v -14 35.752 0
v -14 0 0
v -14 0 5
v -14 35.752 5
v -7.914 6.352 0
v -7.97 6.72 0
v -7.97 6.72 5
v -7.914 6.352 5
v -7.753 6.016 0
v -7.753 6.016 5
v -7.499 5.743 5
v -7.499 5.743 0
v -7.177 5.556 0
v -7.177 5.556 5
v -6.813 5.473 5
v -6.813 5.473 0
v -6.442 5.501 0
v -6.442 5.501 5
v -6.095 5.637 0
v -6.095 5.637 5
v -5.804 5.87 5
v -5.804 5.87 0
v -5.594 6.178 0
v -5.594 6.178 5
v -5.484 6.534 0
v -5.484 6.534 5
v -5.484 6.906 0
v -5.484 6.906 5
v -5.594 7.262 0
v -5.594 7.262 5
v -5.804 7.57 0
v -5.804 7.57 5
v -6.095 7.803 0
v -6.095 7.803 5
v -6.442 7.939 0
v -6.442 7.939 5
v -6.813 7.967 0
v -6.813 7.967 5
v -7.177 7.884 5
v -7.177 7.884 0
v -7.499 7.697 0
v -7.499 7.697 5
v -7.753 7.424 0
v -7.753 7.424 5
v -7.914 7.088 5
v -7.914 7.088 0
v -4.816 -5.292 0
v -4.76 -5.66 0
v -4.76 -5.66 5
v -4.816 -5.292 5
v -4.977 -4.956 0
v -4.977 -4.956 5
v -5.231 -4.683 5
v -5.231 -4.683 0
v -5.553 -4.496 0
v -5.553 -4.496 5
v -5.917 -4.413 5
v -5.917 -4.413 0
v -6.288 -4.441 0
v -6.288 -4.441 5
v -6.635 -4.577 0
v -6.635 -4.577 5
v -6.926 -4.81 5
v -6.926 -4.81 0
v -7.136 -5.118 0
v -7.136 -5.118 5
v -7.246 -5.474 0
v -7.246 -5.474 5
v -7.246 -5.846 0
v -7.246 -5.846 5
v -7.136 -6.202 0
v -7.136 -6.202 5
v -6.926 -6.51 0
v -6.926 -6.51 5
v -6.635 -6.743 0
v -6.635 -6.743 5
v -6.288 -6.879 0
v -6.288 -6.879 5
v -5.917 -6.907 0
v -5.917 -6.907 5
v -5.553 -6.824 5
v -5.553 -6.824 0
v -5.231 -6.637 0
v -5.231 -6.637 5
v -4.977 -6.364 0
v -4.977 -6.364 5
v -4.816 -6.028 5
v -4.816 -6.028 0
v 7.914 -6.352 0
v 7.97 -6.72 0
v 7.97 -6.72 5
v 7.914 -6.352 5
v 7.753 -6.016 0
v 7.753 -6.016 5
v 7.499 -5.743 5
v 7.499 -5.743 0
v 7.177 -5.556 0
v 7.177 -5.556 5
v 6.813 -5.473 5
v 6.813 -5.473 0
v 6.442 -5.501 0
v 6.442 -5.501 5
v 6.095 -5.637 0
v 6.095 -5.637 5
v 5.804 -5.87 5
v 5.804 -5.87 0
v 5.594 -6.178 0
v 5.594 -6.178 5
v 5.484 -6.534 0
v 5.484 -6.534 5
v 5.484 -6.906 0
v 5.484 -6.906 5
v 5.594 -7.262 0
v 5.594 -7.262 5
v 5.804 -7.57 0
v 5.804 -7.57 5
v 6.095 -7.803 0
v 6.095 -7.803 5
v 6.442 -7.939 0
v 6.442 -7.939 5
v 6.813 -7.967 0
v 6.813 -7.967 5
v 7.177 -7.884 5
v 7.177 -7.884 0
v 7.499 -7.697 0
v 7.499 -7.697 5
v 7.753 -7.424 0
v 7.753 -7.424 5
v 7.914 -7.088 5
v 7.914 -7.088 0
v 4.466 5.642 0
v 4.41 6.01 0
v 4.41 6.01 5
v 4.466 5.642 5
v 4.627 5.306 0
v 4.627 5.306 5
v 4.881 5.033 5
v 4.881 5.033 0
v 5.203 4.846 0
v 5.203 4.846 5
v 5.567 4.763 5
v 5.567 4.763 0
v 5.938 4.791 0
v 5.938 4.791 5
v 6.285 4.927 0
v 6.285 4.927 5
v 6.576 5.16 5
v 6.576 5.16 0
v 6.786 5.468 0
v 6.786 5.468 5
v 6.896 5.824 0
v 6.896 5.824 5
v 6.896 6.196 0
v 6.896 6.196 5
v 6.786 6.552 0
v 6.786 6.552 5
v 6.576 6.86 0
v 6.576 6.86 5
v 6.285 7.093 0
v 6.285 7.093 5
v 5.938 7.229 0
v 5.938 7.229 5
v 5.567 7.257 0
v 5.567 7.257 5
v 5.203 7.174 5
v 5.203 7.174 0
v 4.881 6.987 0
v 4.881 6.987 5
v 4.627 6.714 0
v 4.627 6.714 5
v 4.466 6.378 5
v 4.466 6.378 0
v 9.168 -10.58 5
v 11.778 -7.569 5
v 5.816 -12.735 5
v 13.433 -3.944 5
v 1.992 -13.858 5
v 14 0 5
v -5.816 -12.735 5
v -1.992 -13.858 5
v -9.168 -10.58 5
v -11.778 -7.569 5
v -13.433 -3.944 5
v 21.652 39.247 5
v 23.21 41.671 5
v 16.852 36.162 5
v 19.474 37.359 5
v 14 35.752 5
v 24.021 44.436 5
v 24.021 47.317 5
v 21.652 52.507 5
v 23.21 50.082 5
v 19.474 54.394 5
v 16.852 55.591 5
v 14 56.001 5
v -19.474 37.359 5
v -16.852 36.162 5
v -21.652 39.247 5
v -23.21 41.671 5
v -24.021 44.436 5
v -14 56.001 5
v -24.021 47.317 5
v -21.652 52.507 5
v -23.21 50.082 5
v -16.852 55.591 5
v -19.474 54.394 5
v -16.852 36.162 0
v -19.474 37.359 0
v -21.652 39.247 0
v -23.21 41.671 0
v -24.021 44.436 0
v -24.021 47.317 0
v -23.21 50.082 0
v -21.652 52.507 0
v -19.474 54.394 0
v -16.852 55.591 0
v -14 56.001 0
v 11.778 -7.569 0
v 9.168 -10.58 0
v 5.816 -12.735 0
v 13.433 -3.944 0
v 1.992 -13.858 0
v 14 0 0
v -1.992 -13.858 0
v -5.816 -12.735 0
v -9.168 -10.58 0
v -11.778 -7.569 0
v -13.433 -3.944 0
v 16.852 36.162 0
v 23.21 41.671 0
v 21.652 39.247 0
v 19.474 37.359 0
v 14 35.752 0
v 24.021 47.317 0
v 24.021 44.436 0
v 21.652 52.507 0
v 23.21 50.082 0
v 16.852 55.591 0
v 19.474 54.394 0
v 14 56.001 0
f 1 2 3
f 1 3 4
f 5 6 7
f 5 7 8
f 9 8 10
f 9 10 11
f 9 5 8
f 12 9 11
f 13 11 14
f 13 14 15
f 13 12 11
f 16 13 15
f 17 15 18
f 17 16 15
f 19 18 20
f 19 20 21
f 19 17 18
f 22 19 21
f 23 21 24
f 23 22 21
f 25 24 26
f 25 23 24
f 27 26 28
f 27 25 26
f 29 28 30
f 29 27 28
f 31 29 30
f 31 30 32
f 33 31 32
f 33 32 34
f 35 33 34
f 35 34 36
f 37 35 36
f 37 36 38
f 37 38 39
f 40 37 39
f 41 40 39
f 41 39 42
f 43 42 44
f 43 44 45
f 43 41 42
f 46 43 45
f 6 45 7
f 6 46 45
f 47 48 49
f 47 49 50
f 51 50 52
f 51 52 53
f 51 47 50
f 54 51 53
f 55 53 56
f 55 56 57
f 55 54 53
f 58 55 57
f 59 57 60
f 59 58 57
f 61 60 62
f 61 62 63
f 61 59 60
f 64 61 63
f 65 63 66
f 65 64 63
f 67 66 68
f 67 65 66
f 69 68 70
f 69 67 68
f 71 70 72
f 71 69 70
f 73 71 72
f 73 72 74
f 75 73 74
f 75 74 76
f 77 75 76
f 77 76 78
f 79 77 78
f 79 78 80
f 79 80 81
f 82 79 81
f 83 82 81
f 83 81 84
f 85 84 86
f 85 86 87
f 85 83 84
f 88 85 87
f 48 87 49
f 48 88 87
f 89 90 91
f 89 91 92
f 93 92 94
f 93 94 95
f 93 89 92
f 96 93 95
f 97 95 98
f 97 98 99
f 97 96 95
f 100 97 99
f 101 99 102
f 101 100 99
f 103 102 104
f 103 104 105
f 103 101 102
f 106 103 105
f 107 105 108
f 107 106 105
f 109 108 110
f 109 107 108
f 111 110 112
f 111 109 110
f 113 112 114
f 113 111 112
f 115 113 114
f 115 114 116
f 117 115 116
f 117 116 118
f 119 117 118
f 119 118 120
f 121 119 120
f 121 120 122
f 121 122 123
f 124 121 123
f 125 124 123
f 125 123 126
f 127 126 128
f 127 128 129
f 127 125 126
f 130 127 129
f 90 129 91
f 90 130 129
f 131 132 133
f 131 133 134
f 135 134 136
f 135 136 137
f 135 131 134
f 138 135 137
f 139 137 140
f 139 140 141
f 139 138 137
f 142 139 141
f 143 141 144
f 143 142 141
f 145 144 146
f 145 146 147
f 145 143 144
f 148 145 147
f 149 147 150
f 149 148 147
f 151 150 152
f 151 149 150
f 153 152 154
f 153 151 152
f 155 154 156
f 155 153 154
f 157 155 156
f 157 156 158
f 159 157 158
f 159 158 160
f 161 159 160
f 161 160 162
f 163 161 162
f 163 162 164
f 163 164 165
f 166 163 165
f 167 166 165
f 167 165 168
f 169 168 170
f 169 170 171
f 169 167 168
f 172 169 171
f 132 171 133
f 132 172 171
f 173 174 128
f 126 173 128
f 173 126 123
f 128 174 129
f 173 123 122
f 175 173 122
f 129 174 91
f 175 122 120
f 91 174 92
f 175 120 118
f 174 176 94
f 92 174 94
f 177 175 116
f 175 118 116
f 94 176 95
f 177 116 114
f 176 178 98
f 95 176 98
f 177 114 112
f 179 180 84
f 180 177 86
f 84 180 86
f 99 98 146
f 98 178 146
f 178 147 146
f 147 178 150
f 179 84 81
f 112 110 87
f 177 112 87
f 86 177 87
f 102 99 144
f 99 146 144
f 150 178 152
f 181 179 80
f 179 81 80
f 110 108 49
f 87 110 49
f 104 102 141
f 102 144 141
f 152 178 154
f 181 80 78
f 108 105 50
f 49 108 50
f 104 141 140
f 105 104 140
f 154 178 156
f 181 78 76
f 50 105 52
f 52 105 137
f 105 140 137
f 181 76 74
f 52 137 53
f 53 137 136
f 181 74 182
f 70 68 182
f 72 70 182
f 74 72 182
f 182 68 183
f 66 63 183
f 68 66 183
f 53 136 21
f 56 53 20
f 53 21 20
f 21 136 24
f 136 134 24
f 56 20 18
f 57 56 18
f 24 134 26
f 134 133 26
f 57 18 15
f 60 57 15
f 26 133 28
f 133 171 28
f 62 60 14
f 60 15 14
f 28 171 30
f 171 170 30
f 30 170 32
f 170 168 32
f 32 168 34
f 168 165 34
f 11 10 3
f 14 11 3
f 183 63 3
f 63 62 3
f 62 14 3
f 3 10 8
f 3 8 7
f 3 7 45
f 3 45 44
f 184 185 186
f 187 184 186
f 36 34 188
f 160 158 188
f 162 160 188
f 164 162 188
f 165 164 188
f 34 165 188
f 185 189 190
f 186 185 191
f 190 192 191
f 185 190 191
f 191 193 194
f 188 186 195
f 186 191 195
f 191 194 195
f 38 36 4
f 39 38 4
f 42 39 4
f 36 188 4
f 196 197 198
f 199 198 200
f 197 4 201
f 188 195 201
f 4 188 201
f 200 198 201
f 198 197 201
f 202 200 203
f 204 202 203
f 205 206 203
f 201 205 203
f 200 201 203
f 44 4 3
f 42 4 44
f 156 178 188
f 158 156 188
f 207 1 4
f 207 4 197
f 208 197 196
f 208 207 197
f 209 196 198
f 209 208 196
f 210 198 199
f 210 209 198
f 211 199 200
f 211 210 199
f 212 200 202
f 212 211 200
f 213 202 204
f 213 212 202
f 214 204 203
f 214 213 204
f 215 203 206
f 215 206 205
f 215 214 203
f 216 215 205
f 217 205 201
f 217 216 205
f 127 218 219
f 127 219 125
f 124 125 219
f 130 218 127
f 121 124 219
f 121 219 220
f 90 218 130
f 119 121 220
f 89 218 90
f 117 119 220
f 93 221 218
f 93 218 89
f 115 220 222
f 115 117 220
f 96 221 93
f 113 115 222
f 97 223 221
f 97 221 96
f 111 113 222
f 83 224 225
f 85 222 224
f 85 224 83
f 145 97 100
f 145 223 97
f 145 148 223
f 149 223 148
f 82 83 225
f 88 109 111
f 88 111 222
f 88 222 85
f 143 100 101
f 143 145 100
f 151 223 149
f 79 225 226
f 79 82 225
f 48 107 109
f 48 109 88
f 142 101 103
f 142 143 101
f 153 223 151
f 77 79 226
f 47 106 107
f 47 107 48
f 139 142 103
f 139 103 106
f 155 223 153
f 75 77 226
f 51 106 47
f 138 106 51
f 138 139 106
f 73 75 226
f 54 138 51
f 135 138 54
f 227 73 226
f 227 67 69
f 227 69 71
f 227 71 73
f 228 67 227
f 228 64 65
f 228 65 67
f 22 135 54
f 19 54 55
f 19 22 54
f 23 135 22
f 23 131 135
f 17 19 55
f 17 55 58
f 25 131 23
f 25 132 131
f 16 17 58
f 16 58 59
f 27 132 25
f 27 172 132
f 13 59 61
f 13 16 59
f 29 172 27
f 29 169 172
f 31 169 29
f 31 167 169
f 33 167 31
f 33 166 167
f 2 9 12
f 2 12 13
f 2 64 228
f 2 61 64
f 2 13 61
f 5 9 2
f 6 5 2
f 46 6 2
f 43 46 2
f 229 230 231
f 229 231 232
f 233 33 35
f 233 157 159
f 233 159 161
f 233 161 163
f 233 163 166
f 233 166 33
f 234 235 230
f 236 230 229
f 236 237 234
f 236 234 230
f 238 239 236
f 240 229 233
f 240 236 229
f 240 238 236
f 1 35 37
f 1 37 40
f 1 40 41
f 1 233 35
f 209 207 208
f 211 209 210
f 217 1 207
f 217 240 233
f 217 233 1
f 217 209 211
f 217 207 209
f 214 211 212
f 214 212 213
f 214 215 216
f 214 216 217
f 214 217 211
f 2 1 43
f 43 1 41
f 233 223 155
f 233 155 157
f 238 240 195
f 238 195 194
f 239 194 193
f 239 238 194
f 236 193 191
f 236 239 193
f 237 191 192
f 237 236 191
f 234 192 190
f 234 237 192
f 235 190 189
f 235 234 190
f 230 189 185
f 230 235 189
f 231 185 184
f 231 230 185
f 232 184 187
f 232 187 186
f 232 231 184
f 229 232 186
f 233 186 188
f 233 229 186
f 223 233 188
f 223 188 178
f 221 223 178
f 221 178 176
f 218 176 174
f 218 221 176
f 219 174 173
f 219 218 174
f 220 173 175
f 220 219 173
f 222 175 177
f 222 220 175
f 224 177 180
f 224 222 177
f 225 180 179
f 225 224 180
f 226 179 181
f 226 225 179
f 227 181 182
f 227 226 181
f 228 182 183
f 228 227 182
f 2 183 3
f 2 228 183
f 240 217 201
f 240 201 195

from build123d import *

# Parameters (mm, degrees)
SKETCH1_R           = 1.25
BOSS_EXTRUDE1_DEPTH = 5


with BuildPart() as part:
    # Sketch1 → Boss-Extrude1 (new body)
    with BuildSketch(Plane.XY):
        with BuildLine():
            Line((-14, 0), (-14, 35.752157845))
            ThreePointArc((-14, 35.752157845), (-24.124447597, 45.876605442), (-14, 56.001053039))
            Line((-14, 56.001053039), (14, 56.001053039))
            ThreePointArc((14, 56.001053039), (24.124447597, 45.876605442), (14, 35.752157845))
            Line((14, 35.752157845), (14, 0))
            ThreePointArc((14, 0), (0, -14), (-14, 0))
        make_face()
        with Locations((6.72, -6.72)):
            Circle(SKETCH1_R, mode=Mode.SUBTRACT)
        with Locations((-6.01, -5.66)):
            Circle(SKETCH1_R, mode=Mode.SUBTRACT)
        with Locations(Location((5.66, 6.01, 0), (0, 0, 180))):
            Circle(SKETCH1_R, mode=Mode.SUBTRACT)
        with Locations(Location((-6.72, 6.72, 0), (0, 0, 180))):
            Circle(SKETCH1_R, mode=Mode.SUBTRACT)
    extrude(amount=BOSS_EXTRUDE1_DEPTH)


solid = part.part
